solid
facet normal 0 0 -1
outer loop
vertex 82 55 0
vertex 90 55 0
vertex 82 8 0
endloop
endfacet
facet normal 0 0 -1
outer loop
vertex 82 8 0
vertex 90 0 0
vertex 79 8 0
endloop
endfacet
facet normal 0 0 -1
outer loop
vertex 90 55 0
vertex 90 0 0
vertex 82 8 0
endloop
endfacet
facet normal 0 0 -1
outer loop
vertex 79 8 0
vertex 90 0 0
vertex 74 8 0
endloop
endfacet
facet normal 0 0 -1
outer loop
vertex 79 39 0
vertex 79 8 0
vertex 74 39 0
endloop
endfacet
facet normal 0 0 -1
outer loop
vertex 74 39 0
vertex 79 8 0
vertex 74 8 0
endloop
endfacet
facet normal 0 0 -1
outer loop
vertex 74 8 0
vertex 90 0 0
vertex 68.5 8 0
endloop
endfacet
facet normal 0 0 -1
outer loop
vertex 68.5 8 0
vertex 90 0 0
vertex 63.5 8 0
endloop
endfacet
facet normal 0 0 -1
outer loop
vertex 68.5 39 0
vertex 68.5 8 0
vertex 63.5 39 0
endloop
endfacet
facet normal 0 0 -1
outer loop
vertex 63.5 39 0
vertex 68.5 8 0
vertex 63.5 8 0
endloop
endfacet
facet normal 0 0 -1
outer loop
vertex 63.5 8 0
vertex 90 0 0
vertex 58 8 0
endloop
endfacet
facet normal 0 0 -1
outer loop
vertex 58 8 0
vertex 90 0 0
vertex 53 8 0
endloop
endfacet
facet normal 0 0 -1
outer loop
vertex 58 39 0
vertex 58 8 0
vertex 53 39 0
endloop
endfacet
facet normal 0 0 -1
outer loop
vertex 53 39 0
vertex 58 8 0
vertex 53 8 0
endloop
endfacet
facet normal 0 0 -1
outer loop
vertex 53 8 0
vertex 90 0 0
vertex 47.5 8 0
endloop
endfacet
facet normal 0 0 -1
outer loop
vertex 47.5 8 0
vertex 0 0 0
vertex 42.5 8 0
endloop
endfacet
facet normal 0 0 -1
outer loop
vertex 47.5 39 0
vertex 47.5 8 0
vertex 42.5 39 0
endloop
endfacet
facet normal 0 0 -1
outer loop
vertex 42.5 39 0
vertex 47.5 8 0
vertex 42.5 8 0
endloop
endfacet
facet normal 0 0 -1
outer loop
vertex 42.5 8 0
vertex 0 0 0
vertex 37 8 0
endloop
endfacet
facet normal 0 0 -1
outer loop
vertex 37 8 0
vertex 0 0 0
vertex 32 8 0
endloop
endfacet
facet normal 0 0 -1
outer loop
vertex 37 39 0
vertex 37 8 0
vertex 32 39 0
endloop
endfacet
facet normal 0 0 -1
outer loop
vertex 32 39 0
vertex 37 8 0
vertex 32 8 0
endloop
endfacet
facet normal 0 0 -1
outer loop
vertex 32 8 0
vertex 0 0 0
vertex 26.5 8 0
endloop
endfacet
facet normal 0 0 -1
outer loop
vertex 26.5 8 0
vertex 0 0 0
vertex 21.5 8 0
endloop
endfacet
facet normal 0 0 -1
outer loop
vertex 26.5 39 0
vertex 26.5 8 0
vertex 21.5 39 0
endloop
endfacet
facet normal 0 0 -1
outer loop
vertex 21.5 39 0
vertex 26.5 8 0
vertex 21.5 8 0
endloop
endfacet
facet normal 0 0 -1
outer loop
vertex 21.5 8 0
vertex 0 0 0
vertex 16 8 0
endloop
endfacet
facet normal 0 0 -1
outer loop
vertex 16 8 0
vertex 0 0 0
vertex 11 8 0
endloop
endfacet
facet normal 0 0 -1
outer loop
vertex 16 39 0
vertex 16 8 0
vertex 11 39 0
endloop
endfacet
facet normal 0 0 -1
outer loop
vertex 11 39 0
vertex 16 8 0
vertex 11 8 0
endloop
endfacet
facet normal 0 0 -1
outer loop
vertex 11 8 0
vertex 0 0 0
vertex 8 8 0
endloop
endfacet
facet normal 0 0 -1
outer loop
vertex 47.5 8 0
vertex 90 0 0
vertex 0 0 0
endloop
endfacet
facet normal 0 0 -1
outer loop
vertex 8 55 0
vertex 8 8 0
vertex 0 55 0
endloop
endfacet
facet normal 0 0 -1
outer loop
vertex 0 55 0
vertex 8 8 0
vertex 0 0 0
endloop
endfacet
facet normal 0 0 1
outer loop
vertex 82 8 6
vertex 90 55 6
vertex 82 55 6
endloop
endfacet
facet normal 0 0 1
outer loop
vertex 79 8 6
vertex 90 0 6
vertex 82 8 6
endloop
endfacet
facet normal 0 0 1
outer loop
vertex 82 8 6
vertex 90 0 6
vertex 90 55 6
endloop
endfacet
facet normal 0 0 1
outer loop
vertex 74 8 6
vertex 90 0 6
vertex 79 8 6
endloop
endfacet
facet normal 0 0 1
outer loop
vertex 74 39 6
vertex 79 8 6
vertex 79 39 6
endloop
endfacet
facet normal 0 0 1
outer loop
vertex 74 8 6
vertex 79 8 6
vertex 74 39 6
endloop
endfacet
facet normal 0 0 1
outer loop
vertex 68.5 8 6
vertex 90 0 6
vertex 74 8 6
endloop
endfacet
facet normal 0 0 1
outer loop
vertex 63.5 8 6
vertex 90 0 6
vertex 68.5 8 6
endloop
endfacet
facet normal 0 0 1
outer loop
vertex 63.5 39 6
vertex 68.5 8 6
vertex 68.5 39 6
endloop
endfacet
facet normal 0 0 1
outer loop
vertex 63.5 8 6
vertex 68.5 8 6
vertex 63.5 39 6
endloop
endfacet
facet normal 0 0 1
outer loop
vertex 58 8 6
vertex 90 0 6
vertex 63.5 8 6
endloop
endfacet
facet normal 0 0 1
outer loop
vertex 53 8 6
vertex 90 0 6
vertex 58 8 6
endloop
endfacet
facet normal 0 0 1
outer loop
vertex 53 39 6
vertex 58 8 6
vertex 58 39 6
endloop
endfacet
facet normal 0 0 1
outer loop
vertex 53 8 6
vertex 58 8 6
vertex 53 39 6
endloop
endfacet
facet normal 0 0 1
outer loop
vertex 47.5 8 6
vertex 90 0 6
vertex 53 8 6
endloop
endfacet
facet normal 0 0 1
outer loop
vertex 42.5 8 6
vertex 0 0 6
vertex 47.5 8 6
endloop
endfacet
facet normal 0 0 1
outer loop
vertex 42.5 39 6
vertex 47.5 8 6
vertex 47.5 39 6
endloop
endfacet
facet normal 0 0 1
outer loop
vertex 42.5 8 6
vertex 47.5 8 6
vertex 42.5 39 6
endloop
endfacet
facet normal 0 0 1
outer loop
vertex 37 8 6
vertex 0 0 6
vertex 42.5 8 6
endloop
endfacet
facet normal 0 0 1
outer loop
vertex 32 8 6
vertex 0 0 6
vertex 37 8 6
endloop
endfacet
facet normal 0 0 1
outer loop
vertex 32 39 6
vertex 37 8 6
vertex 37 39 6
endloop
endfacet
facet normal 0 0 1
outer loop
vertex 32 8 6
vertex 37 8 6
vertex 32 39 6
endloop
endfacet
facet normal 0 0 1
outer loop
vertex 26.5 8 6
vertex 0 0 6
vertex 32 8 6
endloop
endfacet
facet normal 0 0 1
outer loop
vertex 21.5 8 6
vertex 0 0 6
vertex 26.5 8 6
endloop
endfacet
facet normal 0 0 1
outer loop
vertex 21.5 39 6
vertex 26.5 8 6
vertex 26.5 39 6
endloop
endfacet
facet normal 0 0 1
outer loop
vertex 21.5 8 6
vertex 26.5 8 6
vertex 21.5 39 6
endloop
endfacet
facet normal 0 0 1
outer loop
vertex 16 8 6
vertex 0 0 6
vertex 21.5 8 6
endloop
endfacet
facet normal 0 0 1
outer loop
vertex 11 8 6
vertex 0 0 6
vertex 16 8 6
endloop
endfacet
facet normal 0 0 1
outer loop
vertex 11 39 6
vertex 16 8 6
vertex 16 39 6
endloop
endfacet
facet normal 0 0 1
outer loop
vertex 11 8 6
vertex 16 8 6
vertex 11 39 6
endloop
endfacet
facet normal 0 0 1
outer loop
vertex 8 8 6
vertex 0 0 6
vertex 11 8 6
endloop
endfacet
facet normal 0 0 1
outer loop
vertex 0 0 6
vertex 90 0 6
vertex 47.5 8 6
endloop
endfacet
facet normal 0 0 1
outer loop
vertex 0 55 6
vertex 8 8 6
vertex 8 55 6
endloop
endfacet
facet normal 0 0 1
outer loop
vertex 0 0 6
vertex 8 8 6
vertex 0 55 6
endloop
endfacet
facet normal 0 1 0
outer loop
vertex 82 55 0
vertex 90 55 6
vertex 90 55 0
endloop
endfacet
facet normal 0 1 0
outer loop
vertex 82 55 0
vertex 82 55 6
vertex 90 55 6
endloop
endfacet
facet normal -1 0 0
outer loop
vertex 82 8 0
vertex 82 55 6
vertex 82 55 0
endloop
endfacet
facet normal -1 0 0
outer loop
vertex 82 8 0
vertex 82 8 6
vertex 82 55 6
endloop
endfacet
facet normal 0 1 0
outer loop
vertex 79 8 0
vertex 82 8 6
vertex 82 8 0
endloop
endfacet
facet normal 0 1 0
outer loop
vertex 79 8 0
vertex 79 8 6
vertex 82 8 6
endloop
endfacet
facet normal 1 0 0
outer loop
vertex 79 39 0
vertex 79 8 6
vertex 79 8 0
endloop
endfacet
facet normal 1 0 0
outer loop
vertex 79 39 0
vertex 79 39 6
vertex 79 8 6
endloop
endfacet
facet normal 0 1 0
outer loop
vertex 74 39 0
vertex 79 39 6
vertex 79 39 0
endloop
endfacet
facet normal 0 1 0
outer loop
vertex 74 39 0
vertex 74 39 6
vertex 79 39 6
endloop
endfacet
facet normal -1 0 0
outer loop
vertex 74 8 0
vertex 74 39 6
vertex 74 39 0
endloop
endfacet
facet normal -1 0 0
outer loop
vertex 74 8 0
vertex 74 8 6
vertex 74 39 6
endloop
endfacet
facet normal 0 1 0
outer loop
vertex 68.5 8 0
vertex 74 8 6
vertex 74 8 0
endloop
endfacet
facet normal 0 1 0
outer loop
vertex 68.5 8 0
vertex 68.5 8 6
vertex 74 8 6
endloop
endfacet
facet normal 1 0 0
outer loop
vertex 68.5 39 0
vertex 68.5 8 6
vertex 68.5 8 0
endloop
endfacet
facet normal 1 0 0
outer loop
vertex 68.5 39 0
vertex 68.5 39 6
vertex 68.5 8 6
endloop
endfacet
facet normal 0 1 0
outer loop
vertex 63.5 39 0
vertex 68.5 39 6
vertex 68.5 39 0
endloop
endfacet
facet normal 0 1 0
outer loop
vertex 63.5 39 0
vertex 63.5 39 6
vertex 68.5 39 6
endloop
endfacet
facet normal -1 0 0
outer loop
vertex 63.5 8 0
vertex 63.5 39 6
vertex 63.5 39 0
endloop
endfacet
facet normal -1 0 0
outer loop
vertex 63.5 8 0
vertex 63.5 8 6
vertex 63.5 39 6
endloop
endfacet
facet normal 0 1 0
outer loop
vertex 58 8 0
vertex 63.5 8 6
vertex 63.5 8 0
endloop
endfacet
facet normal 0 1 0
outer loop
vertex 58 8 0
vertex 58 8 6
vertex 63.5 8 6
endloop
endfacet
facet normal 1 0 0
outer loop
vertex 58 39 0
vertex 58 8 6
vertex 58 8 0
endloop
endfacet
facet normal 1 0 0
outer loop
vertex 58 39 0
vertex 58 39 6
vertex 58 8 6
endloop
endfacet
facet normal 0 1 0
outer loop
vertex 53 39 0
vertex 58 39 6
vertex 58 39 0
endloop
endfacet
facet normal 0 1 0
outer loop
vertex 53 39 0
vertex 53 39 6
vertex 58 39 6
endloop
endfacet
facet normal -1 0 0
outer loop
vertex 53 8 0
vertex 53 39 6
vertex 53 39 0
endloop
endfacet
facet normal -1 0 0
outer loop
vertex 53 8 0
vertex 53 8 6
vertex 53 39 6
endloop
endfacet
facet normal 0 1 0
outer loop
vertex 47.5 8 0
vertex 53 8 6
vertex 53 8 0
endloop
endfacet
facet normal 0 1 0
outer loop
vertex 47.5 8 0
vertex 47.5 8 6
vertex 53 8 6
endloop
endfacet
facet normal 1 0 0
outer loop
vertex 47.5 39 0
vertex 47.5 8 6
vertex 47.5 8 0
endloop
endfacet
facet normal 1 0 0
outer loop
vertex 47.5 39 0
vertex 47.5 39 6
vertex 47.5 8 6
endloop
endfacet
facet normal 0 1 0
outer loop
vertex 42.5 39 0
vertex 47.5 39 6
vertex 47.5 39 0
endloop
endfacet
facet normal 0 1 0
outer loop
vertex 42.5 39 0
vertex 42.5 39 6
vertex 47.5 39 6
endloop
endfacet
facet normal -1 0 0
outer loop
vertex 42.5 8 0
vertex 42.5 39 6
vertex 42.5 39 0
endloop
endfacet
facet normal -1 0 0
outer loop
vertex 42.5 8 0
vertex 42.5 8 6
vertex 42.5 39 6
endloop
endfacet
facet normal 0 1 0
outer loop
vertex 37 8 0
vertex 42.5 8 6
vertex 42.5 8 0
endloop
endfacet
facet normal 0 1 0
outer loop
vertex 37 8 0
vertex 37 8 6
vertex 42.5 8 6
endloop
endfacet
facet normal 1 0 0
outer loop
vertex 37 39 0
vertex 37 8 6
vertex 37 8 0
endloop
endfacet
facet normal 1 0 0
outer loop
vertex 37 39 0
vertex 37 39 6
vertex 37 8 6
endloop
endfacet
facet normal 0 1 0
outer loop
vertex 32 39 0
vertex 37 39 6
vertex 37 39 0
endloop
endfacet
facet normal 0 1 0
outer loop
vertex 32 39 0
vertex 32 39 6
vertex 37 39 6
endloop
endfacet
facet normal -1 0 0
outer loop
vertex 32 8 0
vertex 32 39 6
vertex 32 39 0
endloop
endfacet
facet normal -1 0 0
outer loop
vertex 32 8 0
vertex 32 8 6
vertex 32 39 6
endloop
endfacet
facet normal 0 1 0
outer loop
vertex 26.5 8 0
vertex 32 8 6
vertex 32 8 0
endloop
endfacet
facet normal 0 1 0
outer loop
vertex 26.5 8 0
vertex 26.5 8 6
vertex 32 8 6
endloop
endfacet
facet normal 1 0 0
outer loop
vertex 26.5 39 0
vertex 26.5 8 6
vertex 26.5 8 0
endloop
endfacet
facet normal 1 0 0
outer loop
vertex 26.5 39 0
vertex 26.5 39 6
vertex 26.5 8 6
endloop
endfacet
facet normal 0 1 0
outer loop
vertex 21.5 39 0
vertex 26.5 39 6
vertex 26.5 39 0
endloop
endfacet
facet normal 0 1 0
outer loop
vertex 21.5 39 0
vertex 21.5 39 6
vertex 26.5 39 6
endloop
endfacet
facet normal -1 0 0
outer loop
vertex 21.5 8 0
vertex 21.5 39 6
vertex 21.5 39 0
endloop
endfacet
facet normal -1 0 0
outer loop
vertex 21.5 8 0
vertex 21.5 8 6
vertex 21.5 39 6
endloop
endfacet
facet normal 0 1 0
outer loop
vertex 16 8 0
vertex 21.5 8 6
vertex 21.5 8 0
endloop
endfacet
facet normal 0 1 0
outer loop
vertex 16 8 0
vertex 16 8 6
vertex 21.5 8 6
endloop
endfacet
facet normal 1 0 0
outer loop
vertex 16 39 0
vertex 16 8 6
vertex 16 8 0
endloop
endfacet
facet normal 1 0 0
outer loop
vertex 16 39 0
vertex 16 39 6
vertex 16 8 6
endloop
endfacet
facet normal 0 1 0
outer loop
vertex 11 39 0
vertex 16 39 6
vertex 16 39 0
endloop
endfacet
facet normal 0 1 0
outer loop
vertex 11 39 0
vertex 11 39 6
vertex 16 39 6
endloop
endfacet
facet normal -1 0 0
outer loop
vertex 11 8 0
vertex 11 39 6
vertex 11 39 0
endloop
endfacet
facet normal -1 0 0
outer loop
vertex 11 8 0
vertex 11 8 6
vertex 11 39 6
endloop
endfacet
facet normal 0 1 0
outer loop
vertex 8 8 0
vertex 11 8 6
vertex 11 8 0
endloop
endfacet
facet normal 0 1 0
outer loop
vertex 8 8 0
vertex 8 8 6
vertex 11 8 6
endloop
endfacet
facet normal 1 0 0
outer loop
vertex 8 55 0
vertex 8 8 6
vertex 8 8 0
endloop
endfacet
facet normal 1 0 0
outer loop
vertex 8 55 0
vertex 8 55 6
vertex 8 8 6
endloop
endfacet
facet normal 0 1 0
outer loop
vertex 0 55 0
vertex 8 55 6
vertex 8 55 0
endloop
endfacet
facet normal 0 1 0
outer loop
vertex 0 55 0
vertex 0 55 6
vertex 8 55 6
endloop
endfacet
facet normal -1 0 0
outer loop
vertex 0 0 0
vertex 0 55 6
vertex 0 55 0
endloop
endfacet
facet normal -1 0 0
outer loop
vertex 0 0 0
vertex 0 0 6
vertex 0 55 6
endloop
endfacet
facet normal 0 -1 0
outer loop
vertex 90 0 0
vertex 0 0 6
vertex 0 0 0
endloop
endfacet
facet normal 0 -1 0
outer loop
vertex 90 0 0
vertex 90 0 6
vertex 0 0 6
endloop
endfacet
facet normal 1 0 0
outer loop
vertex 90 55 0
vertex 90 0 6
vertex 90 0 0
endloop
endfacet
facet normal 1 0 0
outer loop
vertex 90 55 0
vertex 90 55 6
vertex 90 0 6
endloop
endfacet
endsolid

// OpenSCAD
$fn = 32;

// ----------------------------------------------------------------------
// Guard grille: 7 slats over a 90 x 55 mm plate
// ----------------------------------------------------------------------

// --- parameters (mm) ---
profile_height = 6;       // extrusion height
profile_points = 36;      // points of the closed outline

profile = [[0, 0], [90, 0], [90, 55], [82, 55], [82, 8], [79, 8], [79, 39], [74, 39], [74, 8], [68.5, 8], [68.5, 39], [63.5, 39], [63.5, 8], [58, 8], [58, 39], [53, 39], [53, 8], [47.5, 8], [47.5, 39], [42.5, 39], [42.5, 8], [37, 8], [37, 39], [32, 39], [32, 8], [26.5, 8], [26.5, 39], [21.5, 39], [21.5, 8], [16, 8], [16, 39], [11, 39], [11, 8], [8, 8], [8, 55], [0, 55]];  // single closed polygon, 36 points, counter clockwise

// --- the one profile operation ---
linear_extrude(height = profile_height) polygon(points = profile);
